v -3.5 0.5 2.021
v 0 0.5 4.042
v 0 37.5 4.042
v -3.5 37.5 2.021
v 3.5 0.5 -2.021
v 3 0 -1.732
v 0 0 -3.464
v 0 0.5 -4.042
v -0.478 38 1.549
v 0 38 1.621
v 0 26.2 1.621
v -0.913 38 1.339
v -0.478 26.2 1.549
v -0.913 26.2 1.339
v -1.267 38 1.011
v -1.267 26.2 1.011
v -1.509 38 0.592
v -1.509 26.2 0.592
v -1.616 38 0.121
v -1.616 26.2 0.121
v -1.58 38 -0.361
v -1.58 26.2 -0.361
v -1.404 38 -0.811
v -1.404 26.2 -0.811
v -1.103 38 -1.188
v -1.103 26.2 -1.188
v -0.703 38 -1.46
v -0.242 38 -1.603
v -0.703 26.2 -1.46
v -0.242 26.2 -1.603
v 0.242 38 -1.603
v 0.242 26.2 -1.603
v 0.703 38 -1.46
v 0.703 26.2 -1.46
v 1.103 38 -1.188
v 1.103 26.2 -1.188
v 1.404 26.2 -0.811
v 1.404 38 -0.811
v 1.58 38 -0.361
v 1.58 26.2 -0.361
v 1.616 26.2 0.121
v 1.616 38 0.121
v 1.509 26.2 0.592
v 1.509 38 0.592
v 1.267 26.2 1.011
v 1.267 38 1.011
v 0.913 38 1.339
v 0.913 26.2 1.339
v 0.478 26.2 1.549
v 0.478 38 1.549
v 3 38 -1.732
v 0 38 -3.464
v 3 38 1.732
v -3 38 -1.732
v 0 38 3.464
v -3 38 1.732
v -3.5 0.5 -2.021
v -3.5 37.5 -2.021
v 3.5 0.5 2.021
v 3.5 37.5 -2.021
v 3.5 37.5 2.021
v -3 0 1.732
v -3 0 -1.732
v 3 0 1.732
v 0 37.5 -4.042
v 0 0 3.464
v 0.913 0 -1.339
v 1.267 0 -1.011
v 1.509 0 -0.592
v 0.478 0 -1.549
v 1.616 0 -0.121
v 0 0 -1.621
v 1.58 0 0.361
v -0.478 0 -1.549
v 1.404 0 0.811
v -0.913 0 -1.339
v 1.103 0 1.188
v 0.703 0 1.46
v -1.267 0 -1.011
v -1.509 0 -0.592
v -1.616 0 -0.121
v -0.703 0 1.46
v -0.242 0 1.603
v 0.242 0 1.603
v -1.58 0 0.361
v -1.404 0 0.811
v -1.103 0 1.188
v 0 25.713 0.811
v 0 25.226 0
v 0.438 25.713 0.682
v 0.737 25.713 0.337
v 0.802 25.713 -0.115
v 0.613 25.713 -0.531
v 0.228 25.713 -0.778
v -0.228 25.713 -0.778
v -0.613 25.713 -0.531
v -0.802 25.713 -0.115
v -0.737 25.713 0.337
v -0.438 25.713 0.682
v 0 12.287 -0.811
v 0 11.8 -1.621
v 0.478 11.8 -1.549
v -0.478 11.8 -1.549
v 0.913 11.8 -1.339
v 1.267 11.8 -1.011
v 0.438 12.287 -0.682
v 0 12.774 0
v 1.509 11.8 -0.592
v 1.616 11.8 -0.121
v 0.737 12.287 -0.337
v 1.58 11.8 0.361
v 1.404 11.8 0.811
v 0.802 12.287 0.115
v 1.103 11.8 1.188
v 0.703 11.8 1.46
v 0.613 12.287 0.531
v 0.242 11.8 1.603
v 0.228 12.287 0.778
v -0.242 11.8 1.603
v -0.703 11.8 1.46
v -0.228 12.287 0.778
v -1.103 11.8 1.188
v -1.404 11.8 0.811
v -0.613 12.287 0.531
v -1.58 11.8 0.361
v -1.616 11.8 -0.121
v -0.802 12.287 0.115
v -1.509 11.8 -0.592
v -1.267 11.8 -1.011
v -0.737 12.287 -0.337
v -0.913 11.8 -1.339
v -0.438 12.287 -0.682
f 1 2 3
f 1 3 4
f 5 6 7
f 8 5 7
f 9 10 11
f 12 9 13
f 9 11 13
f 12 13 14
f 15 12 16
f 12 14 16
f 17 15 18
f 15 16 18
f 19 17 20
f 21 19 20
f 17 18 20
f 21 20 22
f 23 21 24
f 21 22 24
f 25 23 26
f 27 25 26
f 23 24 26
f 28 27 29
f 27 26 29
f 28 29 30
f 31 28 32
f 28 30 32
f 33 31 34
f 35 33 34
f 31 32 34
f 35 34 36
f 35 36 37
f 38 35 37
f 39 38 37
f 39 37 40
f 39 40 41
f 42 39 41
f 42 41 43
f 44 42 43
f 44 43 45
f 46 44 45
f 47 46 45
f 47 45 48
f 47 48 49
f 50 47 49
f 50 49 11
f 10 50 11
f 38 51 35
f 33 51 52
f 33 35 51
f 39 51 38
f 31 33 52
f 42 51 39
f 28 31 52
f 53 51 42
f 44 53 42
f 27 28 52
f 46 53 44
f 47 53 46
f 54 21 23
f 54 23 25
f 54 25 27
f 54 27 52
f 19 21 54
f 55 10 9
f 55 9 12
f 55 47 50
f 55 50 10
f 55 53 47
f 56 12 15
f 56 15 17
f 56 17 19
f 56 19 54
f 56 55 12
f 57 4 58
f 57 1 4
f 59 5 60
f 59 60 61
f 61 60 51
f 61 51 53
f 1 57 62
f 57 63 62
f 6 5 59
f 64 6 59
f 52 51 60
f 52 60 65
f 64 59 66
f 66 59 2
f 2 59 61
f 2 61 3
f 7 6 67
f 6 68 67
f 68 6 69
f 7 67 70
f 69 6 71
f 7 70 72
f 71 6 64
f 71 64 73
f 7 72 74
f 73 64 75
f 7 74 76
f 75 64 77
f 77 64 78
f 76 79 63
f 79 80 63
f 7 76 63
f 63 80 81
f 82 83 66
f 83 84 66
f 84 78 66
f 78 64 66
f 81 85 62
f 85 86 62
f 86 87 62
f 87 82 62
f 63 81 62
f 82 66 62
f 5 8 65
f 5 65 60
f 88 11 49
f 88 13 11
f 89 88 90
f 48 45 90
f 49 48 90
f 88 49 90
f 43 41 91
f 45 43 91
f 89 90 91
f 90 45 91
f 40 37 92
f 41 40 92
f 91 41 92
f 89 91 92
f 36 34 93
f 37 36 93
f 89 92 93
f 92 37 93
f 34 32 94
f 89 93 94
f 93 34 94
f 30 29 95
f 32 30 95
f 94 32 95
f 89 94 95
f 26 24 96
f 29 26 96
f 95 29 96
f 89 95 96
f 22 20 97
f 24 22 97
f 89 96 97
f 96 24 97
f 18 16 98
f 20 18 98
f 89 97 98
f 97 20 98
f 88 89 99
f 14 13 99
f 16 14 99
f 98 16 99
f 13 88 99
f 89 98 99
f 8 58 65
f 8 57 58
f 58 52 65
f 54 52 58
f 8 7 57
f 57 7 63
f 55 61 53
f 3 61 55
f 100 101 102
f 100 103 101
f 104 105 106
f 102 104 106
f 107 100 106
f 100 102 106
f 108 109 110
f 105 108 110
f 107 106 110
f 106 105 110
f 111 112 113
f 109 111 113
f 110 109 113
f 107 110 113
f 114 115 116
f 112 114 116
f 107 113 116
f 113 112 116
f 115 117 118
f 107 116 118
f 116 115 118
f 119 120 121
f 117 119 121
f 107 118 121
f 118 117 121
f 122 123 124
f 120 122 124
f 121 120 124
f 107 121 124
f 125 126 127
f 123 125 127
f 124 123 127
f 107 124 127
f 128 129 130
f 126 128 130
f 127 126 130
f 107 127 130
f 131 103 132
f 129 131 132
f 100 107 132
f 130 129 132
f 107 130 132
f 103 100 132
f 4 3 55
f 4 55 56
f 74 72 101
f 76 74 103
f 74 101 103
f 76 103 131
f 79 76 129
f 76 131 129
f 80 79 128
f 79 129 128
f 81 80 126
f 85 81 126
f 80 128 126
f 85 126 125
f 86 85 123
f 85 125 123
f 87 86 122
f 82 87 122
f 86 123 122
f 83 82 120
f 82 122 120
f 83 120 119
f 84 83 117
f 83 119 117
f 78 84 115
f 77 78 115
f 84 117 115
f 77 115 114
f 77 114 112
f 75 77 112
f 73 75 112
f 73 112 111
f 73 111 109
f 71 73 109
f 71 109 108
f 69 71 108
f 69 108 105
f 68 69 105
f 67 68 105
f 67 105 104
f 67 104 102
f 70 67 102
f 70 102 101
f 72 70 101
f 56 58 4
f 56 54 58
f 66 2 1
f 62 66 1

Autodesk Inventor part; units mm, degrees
ref_plane "YZ Plane" through (0, 0, 0) normal (1, 0, 0) x (0, 1, 0)
ref_plane "XZ Plane" through (0, 0, 0) normal (0, 1, 0) x (-1, 0, 0)
ref_plane "XY Plane" through (0, 0, 0) normal (0, 0, 1) x (1, 0, 0)
sketch "Skizze1" plane through (0, 0, 0) normal (0, 1, 0) x (-1, 0, 0)
  line L0 (3.5, -2.0207) -> (0, -4.0415)
  line L1 (0, -4.0415) -> (-3.5, -2.0207)
  line L2 (-3.5, -2.0207) -> (-3.5, 2.0207)
  line L3 (-3.5, 2.0207) -> (0, 4.0415)
  line L4 (0, 4.0415) -> (3.5, 2.0207)
  line L5 (3.5, 2.0207) -> (3.5, -2.0207)
  point P0 (0, 0)
  point P1 (0, 0)
  dimension "d0" = 7
extrude "Extrusion1" add sketch "Skizze1" along normal blind 38
sketch "Skizze2" plane through (0, 38, 0) normal (0, 1, 0) x (1, 0, 0)
  point P0 (0, 0)
  point P1 (0, 0)
hole "Bohrung1" at (0, 38, 0) direction (0, -1, 0) diameter 3.242 depth 11.8 tip angle 118 thread size "M4x0.7" class "6H" standard "ISO Metric profile"
sketch "Skizze3" plane through (0, 0, 0) normal (0, -1, 0) x (1, 0, 0)
  point P0 (0, 0)
  point P1 (0, 0)
hole "Bohrung2" at (0, 0, 0) direction (0, 1, 0) diameter 3.242 depth 11.8 tip angle 118 thread size "M4x0.7" class "6H" standard "ISO Metric profile"
chamfer "Fasen1" distance 0.5 angle 45 12 edges at (-1.75, 38, 3.0311) (1.75, 38, 3.0311) (3.5, 38, 0) (1.75, 38, -3.0311) (-1.75, 38, -3.0311) (-3.5, 38, 0) (-3.5, 0, 0) (-1.75, 0, 3.0311) (1.75, 0, 3.0311) (3.5, 0, 0) (1.75, 0, -3.0311) (-1.75, 0, -3.0311)
properties part number "Abstandsbolzen 38mm" material "Aluminium 6061"
